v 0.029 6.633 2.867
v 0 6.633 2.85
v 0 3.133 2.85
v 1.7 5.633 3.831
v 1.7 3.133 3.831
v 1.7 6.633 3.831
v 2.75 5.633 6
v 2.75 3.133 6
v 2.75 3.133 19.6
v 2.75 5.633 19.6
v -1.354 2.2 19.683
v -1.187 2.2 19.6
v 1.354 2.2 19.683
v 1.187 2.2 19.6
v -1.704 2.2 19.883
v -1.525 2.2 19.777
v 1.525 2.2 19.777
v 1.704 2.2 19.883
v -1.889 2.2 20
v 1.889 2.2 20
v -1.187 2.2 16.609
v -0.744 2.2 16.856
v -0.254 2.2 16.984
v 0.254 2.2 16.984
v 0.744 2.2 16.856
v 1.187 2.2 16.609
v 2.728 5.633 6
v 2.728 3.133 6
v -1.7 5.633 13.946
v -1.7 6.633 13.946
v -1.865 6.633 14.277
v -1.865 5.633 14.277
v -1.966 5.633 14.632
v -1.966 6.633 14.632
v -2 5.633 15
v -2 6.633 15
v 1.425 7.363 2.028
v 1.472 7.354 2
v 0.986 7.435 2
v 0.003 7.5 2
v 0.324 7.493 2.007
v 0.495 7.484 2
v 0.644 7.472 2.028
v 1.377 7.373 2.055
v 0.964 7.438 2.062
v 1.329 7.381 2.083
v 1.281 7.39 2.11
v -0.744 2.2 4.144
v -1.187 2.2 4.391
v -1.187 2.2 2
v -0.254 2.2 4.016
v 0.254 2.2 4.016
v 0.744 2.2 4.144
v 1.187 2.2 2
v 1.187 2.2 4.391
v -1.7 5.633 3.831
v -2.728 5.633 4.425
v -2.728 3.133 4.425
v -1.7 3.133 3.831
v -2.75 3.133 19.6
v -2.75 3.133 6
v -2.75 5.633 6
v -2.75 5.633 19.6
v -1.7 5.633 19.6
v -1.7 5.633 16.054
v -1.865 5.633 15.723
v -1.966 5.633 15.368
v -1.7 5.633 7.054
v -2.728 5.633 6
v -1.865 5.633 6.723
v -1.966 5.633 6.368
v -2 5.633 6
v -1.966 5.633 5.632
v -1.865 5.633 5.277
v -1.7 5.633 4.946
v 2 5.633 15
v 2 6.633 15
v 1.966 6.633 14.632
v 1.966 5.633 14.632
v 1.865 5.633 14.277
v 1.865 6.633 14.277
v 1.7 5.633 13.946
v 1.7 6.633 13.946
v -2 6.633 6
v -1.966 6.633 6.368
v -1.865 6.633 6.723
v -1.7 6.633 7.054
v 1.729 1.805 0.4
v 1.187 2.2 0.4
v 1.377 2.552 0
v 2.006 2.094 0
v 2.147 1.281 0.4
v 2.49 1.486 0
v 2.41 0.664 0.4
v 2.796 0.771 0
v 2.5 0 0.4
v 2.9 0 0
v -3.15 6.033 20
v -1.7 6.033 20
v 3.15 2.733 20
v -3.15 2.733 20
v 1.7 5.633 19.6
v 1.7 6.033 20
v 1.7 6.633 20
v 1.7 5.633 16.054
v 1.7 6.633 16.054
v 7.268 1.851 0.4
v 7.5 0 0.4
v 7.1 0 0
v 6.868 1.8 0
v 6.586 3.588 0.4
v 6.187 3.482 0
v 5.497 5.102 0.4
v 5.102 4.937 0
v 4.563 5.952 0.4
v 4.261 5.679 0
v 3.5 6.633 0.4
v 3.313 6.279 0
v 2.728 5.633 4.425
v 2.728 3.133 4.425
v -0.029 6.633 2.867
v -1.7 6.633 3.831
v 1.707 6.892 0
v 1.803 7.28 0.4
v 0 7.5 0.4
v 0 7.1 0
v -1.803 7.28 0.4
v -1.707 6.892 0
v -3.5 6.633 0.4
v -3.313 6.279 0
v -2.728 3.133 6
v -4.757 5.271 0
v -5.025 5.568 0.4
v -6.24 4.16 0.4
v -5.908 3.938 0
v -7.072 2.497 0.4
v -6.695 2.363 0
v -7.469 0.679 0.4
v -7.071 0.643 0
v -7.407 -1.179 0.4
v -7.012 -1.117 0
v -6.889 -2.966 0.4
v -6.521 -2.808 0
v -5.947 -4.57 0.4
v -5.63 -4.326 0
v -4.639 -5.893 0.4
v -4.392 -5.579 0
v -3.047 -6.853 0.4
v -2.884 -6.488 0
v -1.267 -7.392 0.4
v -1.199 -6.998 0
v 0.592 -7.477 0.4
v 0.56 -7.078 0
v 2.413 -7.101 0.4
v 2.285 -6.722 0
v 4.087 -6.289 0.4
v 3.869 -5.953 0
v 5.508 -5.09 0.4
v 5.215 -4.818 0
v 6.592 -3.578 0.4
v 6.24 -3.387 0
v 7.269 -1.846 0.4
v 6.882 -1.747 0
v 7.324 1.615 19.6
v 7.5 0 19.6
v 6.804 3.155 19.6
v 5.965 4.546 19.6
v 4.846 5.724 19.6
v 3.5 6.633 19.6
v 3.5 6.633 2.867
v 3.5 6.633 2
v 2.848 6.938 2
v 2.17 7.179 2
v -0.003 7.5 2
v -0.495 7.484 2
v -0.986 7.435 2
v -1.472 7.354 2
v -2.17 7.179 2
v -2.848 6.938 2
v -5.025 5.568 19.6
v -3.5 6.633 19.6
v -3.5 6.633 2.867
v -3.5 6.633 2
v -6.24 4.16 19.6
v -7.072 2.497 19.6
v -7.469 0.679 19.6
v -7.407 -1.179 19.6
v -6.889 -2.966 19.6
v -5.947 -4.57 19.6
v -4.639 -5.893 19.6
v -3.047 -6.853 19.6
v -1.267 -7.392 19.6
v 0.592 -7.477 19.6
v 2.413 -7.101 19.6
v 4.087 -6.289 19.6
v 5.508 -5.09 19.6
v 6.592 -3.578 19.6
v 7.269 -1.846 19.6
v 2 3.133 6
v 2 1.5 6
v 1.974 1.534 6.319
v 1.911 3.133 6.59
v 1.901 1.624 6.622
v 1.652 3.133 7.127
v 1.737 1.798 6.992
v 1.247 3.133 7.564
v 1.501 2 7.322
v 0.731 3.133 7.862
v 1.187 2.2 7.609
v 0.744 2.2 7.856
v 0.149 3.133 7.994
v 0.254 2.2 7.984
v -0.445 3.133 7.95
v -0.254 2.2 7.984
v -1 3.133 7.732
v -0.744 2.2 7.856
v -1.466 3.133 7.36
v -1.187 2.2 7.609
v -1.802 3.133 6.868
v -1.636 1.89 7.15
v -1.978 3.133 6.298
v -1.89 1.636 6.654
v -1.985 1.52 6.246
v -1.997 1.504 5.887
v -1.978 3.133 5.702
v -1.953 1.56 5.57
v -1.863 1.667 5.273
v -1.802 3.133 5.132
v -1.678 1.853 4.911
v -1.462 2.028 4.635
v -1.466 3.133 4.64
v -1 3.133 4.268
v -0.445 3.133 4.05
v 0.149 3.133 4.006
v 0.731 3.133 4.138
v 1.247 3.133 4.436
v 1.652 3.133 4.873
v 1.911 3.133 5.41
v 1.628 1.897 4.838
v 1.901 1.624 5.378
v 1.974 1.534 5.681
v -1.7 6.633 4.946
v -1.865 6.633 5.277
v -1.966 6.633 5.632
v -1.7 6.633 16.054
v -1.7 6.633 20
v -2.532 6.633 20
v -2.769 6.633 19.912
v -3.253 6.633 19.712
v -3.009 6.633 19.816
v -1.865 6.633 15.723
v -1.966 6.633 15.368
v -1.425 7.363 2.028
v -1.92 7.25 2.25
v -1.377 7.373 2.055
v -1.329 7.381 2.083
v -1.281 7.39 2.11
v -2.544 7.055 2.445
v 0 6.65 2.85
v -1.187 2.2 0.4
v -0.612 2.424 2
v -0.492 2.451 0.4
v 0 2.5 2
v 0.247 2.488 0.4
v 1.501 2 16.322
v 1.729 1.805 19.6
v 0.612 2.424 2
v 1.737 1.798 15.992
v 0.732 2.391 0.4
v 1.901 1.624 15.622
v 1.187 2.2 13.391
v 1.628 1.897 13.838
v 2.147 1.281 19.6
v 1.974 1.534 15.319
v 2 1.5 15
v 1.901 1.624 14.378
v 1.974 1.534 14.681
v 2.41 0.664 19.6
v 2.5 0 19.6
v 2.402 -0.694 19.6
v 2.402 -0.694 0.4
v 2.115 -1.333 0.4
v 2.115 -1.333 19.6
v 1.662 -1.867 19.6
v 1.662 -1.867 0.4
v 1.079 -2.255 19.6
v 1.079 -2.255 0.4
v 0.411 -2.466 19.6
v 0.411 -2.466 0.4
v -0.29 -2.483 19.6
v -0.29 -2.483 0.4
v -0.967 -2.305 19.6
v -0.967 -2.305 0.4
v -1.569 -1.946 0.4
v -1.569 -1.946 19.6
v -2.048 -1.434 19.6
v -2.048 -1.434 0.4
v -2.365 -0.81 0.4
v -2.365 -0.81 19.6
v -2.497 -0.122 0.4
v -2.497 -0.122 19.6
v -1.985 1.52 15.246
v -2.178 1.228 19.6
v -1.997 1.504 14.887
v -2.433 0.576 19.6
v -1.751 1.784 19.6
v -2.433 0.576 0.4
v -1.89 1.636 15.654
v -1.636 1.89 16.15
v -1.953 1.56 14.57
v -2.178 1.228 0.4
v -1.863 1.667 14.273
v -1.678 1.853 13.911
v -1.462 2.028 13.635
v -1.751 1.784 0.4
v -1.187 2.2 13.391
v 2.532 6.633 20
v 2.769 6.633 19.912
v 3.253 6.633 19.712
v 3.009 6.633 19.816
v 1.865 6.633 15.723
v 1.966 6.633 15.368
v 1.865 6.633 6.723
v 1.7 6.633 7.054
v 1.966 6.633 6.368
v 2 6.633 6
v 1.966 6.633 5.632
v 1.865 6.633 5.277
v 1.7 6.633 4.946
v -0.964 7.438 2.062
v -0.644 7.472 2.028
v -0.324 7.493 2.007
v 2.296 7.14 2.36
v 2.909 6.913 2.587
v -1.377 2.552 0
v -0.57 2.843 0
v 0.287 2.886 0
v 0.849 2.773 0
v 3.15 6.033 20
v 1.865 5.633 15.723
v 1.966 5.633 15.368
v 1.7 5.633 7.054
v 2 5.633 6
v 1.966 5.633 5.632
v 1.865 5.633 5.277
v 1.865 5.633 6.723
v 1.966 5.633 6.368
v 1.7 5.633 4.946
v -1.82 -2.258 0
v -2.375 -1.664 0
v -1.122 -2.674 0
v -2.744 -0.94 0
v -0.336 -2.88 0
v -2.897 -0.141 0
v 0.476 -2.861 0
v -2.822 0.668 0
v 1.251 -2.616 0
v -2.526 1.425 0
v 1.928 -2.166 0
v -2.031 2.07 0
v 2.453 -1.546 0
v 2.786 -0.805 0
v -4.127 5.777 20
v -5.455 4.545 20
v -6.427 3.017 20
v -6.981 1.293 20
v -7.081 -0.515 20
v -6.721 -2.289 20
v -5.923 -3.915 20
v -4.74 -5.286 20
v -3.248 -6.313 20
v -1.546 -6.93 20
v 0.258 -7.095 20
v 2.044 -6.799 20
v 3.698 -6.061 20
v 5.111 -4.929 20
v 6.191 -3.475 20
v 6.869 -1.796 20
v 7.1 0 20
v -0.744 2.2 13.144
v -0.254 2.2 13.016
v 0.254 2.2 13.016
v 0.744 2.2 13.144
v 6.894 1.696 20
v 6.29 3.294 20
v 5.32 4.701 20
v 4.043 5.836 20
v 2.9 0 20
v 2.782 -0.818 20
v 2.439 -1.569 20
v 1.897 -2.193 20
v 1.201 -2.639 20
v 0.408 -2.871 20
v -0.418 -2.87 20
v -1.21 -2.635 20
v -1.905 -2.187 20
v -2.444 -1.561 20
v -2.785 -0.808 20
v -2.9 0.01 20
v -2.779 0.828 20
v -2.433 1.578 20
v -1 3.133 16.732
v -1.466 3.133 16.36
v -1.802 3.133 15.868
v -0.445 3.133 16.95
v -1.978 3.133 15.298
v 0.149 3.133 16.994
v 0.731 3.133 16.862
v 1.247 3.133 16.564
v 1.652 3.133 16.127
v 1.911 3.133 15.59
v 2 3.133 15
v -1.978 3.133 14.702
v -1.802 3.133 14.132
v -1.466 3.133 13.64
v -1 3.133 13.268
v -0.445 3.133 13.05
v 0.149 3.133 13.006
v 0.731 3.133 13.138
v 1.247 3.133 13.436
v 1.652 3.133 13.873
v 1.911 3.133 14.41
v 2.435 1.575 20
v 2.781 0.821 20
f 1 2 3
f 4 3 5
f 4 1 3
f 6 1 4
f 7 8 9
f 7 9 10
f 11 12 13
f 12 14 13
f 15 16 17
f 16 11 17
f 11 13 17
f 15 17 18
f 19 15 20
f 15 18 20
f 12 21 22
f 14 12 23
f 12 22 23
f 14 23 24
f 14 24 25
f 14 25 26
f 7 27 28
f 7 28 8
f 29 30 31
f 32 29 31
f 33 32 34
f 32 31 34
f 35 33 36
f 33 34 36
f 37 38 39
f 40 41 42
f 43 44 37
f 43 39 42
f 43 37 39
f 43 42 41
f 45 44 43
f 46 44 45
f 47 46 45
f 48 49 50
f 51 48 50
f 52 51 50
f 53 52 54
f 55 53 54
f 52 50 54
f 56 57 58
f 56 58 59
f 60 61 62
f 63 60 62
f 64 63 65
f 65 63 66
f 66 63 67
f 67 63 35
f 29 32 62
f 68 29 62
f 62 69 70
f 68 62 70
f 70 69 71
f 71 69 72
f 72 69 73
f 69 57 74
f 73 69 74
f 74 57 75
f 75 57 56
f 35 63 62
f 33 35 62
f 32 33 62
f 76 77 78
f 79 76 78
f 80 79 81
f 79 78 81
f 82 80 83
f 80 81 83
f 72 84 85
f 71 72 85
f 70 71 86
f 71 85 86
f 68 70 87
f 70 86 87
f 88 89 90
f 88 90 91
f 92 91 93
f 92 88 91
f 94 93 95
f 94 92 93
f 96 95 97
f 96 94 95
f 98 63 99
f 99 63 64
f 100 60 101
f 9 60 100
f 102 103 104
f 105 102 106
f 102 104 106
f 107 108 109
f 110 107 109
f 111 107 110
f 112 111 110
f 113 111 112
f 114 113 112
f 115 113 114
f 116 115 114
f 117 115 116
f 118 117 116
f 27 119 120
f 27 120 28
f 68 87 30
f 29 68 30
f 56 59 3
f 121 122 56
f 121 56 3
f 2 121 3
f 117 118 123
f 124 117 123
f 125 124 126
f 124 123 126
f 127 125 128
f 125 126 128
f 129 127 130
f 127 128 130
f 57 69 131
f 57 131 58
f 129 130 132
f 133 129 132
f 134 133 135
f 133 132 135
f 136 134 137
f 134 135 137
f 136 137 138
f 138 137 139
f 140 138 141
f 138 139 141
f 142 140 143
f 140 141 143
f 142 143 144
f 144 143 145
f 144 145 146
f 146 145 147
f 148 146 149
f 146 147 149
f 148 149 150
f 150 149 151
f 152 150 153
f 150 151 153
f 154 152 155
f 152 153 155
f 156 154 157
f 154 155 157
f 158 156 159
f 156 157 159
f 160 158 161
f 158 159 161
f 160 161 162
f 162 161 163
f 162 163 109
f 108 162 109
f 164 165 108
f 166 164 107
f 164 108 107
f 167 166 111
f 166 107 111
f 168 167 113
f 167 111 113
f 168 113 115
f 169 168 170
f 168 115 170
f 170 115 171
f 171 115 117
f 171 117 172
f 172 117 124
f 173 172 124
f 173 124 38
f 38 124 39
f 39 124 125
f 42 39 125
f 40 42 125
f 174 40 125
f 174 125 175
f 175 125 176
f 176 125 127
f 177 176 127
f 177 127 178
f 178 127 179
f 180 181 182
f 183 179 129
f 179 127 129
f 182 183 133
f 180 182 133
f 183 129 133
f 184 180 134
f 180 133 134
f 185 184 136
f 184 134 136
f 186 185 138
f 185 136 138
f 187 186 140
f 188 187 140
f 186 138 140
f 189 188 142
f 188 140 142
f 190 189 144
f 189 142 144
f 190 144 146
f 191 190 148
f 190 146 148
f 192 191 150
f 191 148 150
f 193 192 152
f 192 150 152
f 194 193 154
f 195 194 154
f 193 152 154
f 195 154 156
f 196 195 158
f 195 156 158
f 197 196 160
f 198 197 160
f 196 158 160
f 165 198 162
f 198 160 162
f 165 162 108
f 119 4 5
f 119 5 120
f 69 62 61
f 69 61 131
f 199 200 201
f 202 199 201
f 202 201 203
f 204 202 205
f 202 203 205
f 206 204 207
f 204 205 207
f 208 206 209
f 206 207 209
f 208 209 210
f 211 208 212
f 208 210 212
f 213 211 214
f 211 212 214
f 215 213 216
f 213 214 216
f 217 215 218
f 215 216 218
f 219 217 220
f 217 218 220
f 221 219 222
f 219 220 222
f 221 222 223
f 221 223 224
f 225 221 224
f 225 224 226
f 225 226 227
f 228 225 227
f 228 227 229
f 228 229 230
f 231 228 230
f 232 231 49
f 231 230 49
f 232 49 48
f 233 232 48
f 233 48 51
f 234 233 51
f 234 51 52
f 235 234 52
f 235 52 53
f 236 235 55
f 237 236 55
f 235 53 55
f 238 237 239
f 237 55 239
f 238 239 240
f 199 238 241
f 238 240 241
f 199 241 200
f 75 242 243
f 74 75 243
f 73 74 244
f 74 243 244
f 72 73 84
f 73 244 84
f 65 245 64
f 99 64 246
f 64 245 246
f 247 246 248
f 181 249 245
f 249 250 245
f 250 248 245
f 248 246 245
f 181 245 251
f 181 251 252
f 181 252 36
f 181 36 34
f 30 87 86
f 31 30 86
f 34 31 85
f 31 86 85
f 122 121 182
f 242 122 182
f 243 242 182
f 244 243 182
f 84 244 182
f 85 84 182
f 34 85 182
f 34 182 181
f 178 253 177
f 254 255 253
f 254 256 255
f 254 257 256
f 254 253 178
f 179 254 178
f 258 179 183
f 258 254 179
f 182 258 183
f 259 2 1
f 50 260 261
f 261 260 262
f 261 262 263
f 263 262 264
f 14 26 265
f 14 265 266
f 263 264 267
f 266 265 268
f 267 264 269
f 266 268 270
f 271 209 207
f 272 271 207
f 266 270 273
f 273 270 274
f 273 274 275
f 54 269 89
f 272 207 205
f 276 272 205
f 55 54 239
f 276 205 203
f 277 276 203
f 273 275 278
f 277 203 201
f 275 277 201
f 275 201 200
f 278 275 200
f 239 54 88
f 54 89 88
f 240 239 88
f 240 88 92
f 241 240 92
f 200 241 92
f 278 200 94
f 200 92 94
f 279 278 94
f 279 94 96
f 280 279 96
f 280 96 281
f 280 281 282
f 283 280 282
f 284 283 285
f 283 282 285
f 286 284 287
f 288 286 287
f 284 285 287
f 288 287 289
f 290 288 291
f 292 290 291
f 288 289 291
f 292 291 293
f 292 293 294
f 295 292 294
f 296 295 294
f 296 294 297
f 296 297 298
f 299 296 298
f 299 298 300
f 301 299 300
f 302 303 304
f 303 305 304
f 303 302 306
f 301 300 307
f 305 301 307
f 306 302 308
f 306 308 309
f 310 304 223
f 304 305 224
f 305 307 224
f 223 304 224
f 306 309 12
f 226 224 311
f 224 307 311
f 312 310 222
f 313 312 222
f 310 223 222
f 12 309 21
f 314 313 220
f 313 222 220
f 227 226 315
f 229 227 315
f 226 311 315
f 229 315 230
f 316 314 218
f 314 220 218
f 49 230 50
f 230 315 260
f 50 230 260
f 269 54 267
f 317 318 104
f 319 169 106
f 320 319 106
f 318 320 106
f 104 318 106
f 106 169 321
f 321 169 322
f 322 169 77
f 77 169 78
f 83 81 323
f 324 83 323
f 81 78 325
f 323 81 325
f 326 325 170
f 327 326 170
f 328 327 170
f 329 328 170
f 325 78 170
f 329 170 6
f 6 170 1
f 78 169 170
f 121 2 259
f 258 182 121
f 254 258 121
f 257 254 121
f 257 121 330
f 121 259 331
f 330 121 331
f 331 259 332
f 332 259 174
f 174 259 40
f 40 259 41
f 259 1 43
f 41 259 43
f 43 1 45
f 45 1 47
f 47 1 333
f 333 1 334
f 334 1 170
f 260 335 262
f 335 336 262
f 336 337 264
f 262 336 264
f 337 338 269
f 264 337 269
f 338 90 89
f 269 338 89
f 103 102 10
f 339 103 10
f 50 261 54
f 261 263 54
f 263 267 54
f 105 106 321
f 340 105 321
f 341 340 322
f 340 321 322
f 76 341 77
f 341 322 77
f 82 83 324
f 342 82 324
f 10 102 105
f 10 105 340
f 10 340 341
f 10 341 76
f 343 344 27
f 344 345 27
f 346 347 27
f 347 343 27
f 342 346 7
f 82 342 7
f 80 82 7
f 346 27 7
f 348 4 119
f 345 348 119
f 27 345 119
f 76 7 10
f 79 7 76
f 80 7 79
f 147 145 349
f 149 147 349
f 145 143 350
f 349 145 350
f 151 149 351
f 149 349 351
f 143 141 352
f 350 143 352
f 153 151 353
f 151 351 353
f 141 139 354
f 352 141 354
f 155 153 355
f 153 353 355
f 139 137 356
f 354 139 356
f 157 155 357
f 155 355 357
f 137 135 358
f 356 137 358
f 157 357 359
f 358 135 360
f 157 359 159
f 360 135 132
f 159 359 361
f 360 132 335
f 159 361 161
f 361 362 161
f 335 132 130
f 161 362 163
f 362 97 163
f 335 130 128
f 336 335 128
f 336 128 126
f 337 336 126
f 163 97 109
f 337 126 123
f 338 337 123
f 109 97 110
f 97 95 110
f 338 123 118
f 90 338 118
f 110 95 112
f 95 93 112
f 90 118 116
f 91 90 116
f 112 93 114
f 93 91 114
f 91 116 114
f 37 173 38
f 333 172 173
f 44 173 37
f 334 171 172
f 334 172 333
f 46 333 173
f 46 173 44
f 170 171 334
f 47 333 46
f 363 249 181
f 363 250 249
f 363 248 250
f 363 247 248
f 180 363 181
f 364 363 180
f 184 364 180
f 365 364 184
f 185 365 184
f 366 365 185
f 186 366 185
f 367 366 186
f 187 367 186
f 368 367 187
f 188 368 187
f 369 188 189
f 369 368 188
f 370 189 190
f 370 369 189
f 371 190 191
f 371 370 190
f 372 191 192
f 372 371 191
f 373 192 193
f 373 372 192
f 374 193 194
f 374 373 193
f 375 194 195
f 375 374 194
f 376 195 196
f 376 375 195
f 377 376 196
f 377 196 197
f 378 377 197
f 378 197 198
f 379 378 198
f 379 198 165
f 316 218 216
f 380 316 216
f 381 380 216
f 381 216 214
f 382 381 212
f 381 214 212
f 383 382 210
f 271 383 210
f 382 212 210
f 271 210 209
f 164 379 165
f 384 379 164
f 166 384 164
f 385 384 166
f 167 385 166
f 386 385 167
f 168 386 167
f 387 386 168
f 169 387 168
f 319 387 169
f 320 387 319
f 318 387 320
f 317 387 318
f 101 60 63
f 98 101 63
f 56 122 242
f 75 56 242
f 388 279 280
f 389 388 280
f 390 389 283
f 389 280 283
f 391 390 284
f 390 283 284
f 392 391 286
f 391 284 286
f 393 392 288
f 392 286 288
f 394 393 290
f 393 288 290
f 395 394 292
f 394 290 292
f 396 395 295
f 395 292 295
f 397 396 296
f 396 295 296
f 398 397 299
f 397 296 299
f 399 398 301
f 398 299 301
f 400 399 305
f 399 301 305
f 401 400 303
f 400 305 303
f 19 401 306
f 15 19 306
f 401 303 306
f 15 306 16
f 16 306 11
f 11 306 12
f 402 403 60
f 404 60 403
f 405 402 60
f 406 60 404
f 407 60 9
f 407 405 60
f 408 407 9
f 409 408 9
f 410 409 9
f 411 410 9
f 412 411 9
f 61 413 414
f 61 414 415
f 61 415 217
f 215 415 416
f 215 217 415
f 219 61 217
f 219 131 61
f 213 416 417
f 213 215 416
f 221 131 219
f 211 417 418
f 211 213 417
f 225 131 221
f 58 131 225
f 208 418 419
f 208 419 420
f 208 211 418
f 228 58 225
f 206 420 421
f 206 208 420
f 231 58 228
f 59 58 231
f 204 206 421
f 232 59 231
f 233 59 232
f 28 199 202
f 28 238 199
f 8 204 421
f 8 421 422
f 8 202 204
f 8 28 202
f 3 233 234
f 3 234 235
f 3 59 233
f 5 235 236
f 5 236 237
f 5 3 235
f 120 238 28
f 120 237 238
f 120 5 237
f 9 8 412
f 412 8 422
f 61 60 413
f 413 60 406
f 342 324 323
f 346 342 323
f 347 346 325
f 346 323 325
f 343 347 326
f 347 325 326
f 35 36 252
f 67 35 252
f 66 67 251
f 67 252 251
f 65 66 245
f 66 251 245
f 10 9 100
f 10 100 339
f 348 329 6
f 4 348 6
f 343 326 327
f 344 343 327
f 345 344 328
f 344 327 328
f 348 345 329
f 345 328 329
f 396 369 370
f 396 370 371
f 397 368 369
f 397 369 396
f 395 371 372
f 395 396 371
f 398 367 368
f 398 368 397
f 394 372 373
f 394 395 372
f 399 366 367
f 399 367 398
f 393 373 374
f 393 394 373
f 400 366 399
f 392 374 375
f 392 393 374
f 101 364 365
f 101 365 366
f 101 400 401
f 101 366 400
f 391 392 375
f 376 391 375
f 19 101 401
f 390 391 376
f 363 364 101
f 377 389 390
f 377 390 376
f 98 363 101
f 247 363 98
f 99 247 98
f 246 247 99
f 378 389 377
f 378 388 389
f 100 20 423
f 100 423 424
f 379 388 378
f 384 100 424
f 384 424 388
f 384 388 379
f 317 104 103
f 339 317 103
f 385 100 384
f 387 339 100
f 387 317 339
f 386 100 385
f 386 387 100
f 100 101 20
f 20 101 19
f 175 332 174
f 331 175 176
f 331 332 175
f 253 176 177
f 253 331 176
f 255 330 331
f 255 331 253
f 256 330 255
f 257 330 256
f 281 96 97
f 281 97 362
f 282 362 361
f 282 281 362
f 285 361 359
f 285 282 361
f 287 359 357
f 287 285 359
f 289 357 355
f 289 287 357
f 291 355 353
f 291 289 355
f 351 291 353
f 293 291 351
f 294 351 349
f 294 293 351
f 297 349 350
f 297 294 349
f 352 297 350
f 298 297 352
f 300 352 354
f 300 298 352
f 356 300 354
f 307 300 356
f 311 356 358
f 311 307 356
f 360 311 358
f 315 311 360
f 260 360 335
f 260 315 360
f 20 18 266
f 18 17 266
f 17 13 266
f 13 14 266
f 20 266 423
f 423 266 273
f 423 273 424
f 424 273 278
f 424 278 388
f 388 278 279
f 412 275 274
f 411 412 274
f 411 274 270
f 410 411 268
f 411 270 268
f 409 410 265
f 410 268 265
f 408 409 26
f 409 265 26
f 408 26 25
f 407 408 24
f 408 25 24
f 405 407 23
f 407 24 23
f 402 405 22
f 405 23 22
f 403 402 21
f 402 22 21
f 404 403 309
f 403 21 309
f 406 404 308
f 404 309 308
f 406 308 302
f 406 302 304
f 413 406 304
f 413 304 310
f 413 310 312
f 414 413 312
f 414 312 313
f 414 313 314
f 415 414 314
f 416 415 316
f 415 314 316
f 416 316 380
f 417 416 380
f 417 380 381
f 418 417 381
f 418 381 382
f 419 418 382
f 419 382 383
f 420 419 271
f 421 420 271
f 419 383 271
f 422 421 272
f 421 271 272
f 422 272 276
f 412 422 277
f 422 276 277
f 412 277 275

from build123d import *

# Parameters (mm, degrees)
F1_DEPTH     = 2
F2_W         = 5.5
F2_H         = 2.5
F3_DEPTH     = 18
F6_DEPTH     = 1.34
F7_D         = 4
F7_DEPTH     = 4
F7_START     = 3.5
F7_TIP       = 1.2017212381
F8_DEPTH     = 3.5
F9_T4_DEPTH  = 11.4580124596
F9_S5_R      = 7.5
F9_T6_DEPTH  = 7
F9_T12_DEPTH = 11.4580124596
F9_S13_R     = 7.5
F9_T14_DEPTH = 7
F9_T20_DEPTH = 11.4580124596
F9_S21_R     = 7.5
F9_T22_DEPTH = 7
F10_SIZE     = 0.4


# Not quite as in the source:
# - a fillet or chamfer that OpenCascade refuses, or shapes differently, is made with other operations: its cross-section is extruded or revolved along the edge and cut away or added


with BuildPart() as f1:
    # F0 (on Top) → F1 (new body)
    with BuildSketch(Plane.XY):
        with BuildLine():
            ThreePointArc((-3.5, 6.6332495807), (-3.8729833462, -6.4226162893), (7.5, 0))
            ThreePointArc((7.5, 0), (6.4226162893, 3.8729833462), (3.5, 6.6332495807))
            Line((3.5, 6.6332495807), (-3.5, 6.6332495807))
        make_face()
        with BuildLine():
            ThreePointArc((1.1874342087, 2.2), (2.146926352, 1.2809009482), (2.5, 0))
            ThreePointArc((2.5, 0), (-1.2809009482, -2.146926352), (-1.1874342087, 2.2))
            ThreePointArc((-1.1874342087, 2.2), (0, 2.5), (1.1874342087, 2.2))
        make_face(mode=Mode.SUBTRACT)
        with BuildLine():
            Line((-3.5, 6.6332495807), (3.5, 6.6332495807))
            ThreePointArc((3.5, 6.6332495807), (0, 7.5), (-3.5, 6.6332495807))
        make_face()
    extrude(amount=F1_DEPTH)

    # F2 (on face) → F3 (join)
    with BuildSketch(Plane.XY.offset(2)):
        with BuildLine():
            ThreePointArc((-3.5, 6.6332495807), (-3.8729833462, -6.4226162893), (7.5, 0))
            ThreePointArc((7.5, 0), (6.4226162893, 3.8729833462), (3.5, 6.6332495807))
            Line((3.5, 6.6332495807), (-3.5, 6.6332495807))
        make_face()
        with BuildLine():
            ThreePointArc((1.1874342087, 2.2), (2.146926352, 1.2809009482), (2.5, 0))
            ThreePointArc((2.5, 0), (-1.2809009482, -2.146926352), (-1.1874342087, 2.2))
            ThreePointArc((-1.1874342087, 2.2), (0, 2.5), (1.1874342087, 2.2))
        make_face(mode=Mode.SUBTRACT)
        with Locations((0, 4.3832495807)):
            Rectangle(F2_W, F2_H, mode=Mode.SUBTRACT)
        with BuildLine():
            Line((-1.1874342087, 2.2), (1.1874342087, 2.2))
            ThreePointArc((1.1874342087, 2.2), (0, 2.5), (-1.1874342087, 2.2))
        make_face()
    extrude(amount=F3_DEPTH)

    # F5 (on face) → F6 (cut)
    with BuildSketch(Plane(origin=(0, 6.6332495807, 0), x_dir=(-1, 0, 0), z_dir=(0, 1, 0))):
        with BuildLine():
            Line((1.7, 20), (-1.7, 20))
            Line((-1.7, 20), (-1.7, 16.0535653753))
            ThreePointArc((-1.7, 16.0535653753), (0, 17), (1.7, 16.0535653753))
            Line((1.7, 16.0535653753), (1.7, 20))
        make_face()
        Polygon((-1.7, 3.8314954576), (-1.7, 2), (1.7, 2), (1.7, 3.8314954576), (0, 2.85), align=None)
        with BuildLine():
            Line((1.7, 15), (-1.7, 15))
            Line((-1.7, 15), (-1.7, 13.9464346247))
            ThreePointArc((-1.7, 13.9464346247), (0, 13), (1.7, 13.9464346247))
            Line((1.7, 13.9464346247), (1.7, 15))
        make_face()
        with BuildLine():
            Line((-1.7, 15), (-2, 15))
            ThreePointArc((-2, 15), (-1.9235384062, 14.4522774425), (-1.7, 13.9464346247))
            Line((-1.7, 13.9464346247), (-1.7, 15))
        make_face()
        with BuildLine():
            ThreePointArc((-1.7, 16.0535653753), (-1.9235384062, 15.5477225575), (-2, 15))
            Line((-2, 15), (-1.7, 15))
            Line((-1.7, 15), (-1.7, 16.0535653753))
        make_face()
        with BuildLine():
            Line((1.7, 16.0535653753), (1.7, 15))
            Line((1.7, 15), (2, 15))
            ThreePointArc((2, 15), (1.9235384062, 15.5477225575), (1.7, 16.0535653753))
        make_face()
        with BuildLine():
            Line((2, 15), (1.7, 15))
            Line((1.7, 15), (1.7, 13.9464346247))
            ThreePointArc((1.7, 13.9464346247), (1.9235384062, 14.4522774425), (2, 15))
        make_face()
        with BuildLine():
            Line((-1.7, 16.0535653753), (-1.7, 15))
            Line((-1.7, 15), (1.7, 15))
            Line((1.7, 15), (1.7, 16.0535653753))
            ThreePointArc((1.7, 16.0535653753), (0, 17), (-1.7, 16.0535653753))
        make_face()
        with BuildLine():
            Line((-1.7, 6), (-1.7, 4.9464346247))
            ThreePointArc((-1.7, 4.9464346247), (0, 4), (1.7, 4.9464346247))
            Line((1.7, 4.9464346247), (1.7, 6))
            Line((1.7, 6), (-1.7, 6))
        make_face()
        with BuildLine():
            ThreePointArc((-2, 6), (-1.9235384062, 5.4522774425), (-1.7, 4.9464346247))
            Line((-1.7, 4.9464346247), (-1.7, 6))
            Line((-1.7, 6), (-2, 6))
        make_face()
        with BuildLine():
            Line((-1.7, 7.0535653753), (-1.7, 6))
            Line((-1.7, 6), (1.7, 6))
            Line((1.7, 6), (1.7, 7.0535653753))
            ThreePointArc((1.7, 7.0535653753), (0, 8), (-1.7, 7.0535653753))
        make_face()
        with BuildLine():
            Line((1.7, 7.0535653753), (1.7, 6))
            Line((1.7, 6), (2, 6))
            ThreePointArc((2, 6), (1.9235384062, 6.5477225575), (1.7, 7.0535653753))
        make_face()
        with BuildLine():
            Line((1.7, 6), (1.7, 4.9464346247))
            ThreePointArc((1.7, 4.9464346247), (1.9235384062, 5.4522774425), (2, 6))
            Line((2, 6), (1.7, 6))
        make_face()
        with BuildLine():
            ThreePointArc((-1.7, 7.0535653753), (-1.9235384062, 6.5477225575), (-2, 6))
            Line((-2, 6), (-1.7, 6))
            Line((-1.7, 6), (-1.7, 7.0535653753))
        make_face()
        with BuildLine():
            Line((-1.7, 4.9464346247), (-1.7, 3.8314954576))
            Line((-1.7, 3.8314954576), (0, 2.85))
            Line((0, 2.85), (1.7, 3.8314954576))
            Line((1.7, 3.8314954576), (1.7, 4.9464346247))
            ThreePointArc((1.7, 4.9464346247), (0, 4), (-1.7, 4.9464346247))
        make_face()
        with BuildLine():
            ThreePointArc((1.7, 13.9464346247), (0, 13), (-1.7, 13.9464346247))
            Line((-1.7, 13.9464346247), (-1.7, 8.1685045424))
            Line((-1.7, 8.1685045424), (0, 9.15))
            Line((0, 9.15), (1.7, 8.1685045424))
            Line((1.7, 8.1685045424), (1.7, 13.9464346247))
        make_face()
        with BuildLine():
            Line((-1.7, 8.1685045424), (-1.7, 7.0535653753))
            ThreePointArc((-1.7, 7.0535653753), (0, 8), (1.7, 7.0535653753))
            Line((1.7, 7.0535653753), (1.7, 8.1685045424))
            Line((1.7, 8.1685045424), (0, 9.15))
            Line((0, 9.15), (-1.7, 8.1685045424))
        make_face()
    extrude(amount=-F6_DEPTH, mode=Mode.SUBTRACT)

    # F7
    # its depths count from where the whole tool has entered the part; down to there all is cleared
    with Locations(Plane(origin=(0, 6.6332495807, 0), x_dir=(-1, 0, 0), z_dir=(0, 1, 0)).offset(-F7_START)):
        with Locations((0, 6), (0, 15)):
            Hole(F7_D / 2, depth=F7_DEPTH)
            with Locations((0, 0, -(F7_DEPTH + F7_TIP / 2))):  # 118° drill point
                Cone(0, F7_D / 2, F7_TIP, mode=Mode.SUBTRACT)

    # F5 (on face) → F8 (join)
    with BuildSketch(Plane(origin=(0, 6.6332495807, 0), x_dir=(-1, 0, 0), z_dir=(0, 1, 0))):
        Polygon((-3.5, 6), (-3.5, 2), (-1.7, 2), (-1.7, 3.8314954576), (-2.7279800219, 4.425), (-2.7279800219, 6), align=None)
        Polygon((-1.7, 3.8314954576), (-1.7, 2), (1.7, 2), (1.7, 3.8314954576), (0, 2.85), align=None)
        Polygon((1.7, 3.8314954576), (1.7, 2), (3.5, 2), (3.5, 6), (2.7279800219, 6), (2.7279800219, 4.425), align=None)
    extrude(amount=-F8_DEPTH)

    # F9: chamfer of 0.86675 on 1 edges, made by hand


with BuildPart() as f9_tool2:
    # F9_s3 → F9_t4 (new body)
    with BuildSketch(Plane.YZ.offset(5.7290062298)):
        Polygon((6.6332495807, 2.86675), (7.4999995807, 2), (6.6332495807, 2), align=None)
    extrude(amount=-F9_T4_DEPTH)

    # F9_s5 → F9_t6 (intersect, symmetric)
    with BuildSketch(Plane.XY.offset(2.4)):
        Circle(F9_S5_R)
    extrude(amount=F9_T6_DEPTH, both=True, mode=Mode.INTERSECT)

    split(bisect_by=Plane(origin=(-1.2340862004, 0, 2.1375), x_dir=(0, 1, 0), z_dir=(0.5, 0, -0.8660254038)), keep=Keep.TOP)

    split(bisect_by=Plane(origin=(1.2340862004, 0, 2.1375), x_dir=(0, 1, 0), z_dir=(0.5, 0, 0.8660254038)), keep=Keep.TOP)


with BuildPart() as f1_1:
    add(f1.part)

    # F9_t1: union F9_tool2
    add(f9_tool2.part)


with BuildPart() as f9_tool10:
    # F9_s11 → F9_t12 (new body)
    with BuildSketch(Plane.YZ.offset(5.7290062298)):
        Polygon((6.6332495807, 2.86675), (7.4999995807, 2), (6.6332495807, 2), align=None)
    extrude(amount=-F9_T12_DEPTH)

    # F9_s13 → F9_t14 (intersect, symmetric)
    with BuildSketch(Plane.XY.offset(2.4)):
        Circle(F9_S13_R)
    extrude(amount=F9_T14_DEPTH, both=True, mode=Mode.INTERSECT)

    split(bisect_by=Plane(origin=(-1.2340862004, 0, 2.1375), x_dir=(0, 1, 0), z_dir=(0.5, 0, -0.8660254038)), keep=Keep.TOP)

    split(bisect_by=Plane(origin=(1.2340862004, 0, 2.1375), x_dir=(0, 1, 0), z_dir=(-0.5, 0, -0.8660254038)), keep=Keep.TOP)


with BuildPart() as f1_2:
    add(f1_1.part)

    # F9_t9: union F9_tool10
    add(f9_tool10.part)


with BuildPart() as f9_tool18:
    # F9_s19 → F9_t20 (new body)
    with BuildSketch(Plane.YZ.offset(5.7290062298)):
        Polygon((6.6332495807, 2.86675), (7.4999995807, 2), (6.6332495807, 2), align=None)
    extrude(amount=-F9_T20_DEPTH)

    # F9_s21 → F9_t22 (intersect, symmetric)
    with BuildSketch(Plane.XY.offset(2.4)):
        Circle(F9_S21_R)
    extrude(amount=F9_T22_DEPTH, both=True, mode=Mode.INTERSECT)

    split(bisect_by=Plane(origin=(-1.2340862004, 0, 2.1375), x_dir=(0, 1, 0), z_dir=(-0.5, 0, 0.8660254038)), keep=Keep.TOP)

    split(bisect_by=Plane(origin=(1.2340862004, 0, 2.1375), x_dir=(0, 1, 0), z_dir=(-0.5, 0, -0.8660254038)), keep=Keep.TOP)


with BuildPart() as f1_3:
    add(f1_2.part)

    # F9_t17: union F9_tool18
    add(f9_tool18.part)

    # F10
    f10_edges = [f1_3.edges().sort_by_distance(p)[0] for p in [
        (-7.5, 0, 0),
        (-1.187434, -2.2, 0),
        (0, -2.5, 20),
        (0, -7.5, 20),
        (0, 3.13325, 20),
        (2.75, 4.38325, 20),
        (2.225, 5.63325, 20),
        (-2.225, 5.63325, 20),
        (-2.75, 4.38325, 20),
    ]]
    chamfer(f10_edges, length=F10_SIZE)


solid = f1_3.part
